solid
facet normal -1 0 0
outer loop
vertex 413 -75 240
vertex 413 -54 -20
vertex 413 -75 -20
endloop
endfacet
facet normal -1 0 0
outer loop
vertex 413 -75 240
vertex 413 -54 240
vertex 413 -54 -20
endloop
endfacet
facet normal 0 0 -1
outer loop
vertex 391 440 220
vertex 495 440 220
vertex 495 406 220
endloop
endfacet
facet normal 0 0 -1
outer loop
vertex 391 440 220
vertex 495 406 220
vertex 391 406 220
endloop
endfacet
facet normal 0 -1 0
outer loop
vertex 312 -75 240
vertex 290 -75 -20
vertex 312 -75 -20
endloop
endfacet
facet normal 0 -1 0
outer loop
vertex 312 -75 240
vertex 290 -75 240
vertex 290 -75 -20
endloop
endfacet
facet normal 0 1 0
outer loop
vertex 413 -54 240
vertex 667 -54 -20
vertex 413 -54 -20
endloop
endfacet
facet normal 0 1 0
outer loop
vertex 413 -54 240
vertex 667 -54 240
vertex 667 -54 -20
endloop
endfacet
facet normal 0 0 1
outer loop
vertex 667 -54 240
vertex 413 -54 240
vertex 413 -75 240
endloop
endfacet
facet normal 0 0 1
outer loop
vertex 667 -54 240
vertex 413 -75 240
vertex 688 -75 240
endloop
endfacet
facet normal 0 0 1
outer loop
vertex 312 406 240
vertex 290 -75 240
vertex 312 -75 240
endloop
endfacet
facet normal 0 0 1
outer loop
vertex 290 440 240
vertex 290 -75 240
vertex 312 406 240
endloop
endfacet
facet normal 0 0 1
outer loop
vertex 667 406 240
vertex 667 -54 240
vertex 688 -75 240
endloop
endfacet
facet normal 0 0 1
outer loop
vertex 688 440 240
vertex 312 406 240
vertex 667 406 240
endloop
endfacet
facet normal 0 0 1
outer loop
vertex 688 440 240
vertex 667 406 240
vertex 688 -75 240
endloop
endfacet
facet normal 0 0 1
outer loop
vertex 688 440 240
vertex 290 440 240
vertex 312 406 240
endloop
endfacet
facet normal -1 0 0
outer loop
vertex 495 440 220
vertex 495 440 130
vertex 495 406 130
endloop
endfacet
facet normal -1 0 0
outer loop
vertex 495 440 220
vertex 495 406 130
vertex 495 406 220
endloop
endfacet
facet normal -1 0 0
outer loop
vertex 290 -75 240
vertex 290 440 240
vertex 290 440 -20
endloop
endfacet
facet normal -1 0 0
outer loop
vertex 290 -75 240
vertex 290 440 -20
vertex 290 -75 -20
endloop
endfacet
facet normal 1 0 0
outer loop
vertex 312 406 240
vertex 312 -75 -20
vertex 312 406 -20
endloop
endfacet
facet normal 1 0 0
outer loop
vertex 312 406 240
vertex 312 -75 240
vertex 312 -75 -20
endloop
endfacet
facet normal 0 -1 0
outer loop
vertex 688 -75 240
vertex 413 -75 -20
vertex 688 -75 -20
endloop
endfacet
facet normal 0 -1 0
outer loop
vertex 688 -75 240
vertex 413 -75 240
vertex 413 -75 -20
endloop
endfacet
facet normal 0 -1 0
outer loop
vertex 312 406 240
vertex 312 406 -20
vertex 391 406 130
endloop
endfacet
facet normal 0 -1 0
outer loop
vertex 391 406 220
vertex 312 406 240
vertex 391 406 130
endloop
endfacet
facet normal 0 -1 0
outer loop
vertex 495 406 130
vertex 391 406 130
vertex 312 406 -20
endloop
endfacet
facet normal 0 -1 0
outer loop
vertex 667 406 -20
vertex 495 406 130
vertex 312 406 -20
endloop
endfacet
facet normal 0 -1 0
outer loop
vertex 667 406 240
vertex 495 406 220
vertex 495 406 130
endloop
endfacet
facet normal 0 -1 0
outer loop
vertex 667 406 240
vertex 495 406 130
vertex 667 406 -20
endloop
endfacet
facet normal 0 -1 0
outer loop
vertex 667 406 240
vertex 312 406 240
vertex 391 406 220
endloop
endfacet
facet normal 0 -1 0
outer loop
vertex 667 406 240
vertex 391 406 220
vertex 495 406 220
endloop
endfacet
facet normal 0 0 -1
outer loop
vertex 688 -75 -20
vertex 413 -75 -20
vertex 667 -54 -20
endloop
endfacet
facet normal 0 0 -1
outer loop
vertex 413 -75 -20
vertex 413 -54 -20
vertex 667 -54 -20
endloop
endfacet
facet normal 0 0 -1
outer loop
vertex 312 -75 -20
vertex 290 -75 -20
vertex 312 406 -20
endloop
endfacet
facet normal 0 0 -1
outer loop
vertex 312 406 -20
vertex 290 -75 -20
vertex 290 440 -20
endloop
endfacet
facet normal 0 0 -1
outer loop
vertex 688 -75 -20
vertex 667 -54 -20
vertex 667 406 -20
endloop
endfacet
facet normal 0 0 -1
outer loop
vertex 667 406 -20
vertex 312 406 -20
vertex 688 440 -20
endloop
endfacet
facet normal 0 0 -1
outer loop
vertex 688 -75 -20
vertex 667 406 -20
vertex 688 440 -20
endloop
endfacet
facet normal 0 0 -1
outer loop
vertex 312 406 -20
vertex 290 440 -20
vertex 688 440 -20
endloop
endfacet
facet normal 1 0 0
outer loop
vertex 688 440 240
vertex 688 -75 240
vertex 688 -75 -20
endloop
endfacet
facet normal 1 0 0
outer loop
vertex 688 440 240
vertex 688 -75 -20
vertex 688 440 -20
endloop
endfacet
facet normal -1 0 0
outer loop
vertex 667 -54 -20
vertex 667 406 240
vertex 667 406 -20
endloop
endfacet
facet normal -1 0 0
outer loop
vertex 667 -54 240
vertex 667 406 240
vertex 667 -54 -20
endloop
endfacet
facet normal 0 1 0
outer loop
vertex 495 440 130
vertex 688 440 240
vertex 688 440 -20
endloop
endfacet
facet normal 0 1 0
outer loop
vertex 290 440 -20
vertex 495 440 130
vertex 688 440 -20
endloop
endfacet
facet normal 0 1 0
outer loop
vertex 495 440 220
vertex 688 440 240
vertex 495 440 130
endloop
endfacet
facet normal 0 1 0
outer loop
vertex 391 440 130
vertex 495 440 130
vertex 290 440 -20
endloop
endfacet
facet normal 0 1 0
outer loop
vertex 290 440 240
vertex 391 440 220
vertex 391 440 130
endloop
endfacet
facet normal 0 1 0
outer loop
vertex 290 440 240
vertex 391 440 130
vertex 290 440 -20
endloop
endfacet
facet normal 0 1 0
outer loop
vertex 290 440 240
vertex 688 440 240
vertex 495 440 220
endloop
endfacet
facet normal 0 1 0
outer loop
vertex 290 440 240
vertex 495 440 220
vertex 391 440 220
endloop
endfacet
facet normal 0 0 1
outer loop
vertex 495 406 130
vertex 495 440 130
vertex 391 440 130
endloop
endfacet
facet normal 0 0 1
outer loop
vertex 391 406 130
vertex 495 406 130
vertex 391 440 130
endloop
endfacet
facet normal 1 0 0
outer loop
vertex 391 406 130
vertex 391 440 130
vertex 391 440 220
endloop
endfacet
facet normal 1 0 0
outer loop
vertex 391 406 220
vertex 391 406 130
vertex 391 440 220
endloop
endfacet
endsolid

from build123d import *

# Parameters (mm, degrees)
F2_DEPTH = 20
F4_DEPTH = 220
F5_W     = 104
F5_H     = 90
F6_DEPTH = 40
F7_DEPTH = 25
F8_DEPTH = 20


with BuildPart() as f2:
    # F1 (on face) → F2 (new body)
    with BuildSketch(Plane.XY):
        Polygon((413, -75), (688, -75), (688, 440), (290, 440), (290, 406), (290, 141), (290, -75), align=None)
    extrude(amount=F2_DEPTH)

    # F3 (on face) → F4 (join)
    with BuildSketch(Plane.XY.offset(20)):
        Polygon((667, 406), (667, -54), (413, -54), (413, -75), (688, -75), (688, 406), (688, 440), (290, 440), (290, -75), (312, -75), (312, 43), (312, 124), (312, 406), align=None)
    extrude(amount=F4_DEPTH)

    # F5 (on face) → F6 (cut)
    with BuildSketch(Plane(origin=(0, 440, 0), x_dir=(-1, 0, 0), z_dir=(0, 1, 0))):
        with Locations((-443, 175)):
            Rectangle(F5_W, F5_H)
    extrude(amount=-F6_DEPTH, mode=Mode.SUBTRACT)

    # F7 (cut): a face of the model
    f7_faces = [f2.faces().sort_by_distance(p)[0] for p in [
        (487.8716275443, 172.9163497984, 20),
    ]]
    extrude(f7_faces, amount=-F7_DEPTH, mode=Mode.SUBTRACT)

    # F8 (add): a face of the model
    f8_faces = [f2.faces().sort_by_distance(p)[0] for p in [
        (550.5, -68.4913211786, 0),
    ]]
    extrude(f8_faces, amount=F8_DEPTH)


solid = f2.part
